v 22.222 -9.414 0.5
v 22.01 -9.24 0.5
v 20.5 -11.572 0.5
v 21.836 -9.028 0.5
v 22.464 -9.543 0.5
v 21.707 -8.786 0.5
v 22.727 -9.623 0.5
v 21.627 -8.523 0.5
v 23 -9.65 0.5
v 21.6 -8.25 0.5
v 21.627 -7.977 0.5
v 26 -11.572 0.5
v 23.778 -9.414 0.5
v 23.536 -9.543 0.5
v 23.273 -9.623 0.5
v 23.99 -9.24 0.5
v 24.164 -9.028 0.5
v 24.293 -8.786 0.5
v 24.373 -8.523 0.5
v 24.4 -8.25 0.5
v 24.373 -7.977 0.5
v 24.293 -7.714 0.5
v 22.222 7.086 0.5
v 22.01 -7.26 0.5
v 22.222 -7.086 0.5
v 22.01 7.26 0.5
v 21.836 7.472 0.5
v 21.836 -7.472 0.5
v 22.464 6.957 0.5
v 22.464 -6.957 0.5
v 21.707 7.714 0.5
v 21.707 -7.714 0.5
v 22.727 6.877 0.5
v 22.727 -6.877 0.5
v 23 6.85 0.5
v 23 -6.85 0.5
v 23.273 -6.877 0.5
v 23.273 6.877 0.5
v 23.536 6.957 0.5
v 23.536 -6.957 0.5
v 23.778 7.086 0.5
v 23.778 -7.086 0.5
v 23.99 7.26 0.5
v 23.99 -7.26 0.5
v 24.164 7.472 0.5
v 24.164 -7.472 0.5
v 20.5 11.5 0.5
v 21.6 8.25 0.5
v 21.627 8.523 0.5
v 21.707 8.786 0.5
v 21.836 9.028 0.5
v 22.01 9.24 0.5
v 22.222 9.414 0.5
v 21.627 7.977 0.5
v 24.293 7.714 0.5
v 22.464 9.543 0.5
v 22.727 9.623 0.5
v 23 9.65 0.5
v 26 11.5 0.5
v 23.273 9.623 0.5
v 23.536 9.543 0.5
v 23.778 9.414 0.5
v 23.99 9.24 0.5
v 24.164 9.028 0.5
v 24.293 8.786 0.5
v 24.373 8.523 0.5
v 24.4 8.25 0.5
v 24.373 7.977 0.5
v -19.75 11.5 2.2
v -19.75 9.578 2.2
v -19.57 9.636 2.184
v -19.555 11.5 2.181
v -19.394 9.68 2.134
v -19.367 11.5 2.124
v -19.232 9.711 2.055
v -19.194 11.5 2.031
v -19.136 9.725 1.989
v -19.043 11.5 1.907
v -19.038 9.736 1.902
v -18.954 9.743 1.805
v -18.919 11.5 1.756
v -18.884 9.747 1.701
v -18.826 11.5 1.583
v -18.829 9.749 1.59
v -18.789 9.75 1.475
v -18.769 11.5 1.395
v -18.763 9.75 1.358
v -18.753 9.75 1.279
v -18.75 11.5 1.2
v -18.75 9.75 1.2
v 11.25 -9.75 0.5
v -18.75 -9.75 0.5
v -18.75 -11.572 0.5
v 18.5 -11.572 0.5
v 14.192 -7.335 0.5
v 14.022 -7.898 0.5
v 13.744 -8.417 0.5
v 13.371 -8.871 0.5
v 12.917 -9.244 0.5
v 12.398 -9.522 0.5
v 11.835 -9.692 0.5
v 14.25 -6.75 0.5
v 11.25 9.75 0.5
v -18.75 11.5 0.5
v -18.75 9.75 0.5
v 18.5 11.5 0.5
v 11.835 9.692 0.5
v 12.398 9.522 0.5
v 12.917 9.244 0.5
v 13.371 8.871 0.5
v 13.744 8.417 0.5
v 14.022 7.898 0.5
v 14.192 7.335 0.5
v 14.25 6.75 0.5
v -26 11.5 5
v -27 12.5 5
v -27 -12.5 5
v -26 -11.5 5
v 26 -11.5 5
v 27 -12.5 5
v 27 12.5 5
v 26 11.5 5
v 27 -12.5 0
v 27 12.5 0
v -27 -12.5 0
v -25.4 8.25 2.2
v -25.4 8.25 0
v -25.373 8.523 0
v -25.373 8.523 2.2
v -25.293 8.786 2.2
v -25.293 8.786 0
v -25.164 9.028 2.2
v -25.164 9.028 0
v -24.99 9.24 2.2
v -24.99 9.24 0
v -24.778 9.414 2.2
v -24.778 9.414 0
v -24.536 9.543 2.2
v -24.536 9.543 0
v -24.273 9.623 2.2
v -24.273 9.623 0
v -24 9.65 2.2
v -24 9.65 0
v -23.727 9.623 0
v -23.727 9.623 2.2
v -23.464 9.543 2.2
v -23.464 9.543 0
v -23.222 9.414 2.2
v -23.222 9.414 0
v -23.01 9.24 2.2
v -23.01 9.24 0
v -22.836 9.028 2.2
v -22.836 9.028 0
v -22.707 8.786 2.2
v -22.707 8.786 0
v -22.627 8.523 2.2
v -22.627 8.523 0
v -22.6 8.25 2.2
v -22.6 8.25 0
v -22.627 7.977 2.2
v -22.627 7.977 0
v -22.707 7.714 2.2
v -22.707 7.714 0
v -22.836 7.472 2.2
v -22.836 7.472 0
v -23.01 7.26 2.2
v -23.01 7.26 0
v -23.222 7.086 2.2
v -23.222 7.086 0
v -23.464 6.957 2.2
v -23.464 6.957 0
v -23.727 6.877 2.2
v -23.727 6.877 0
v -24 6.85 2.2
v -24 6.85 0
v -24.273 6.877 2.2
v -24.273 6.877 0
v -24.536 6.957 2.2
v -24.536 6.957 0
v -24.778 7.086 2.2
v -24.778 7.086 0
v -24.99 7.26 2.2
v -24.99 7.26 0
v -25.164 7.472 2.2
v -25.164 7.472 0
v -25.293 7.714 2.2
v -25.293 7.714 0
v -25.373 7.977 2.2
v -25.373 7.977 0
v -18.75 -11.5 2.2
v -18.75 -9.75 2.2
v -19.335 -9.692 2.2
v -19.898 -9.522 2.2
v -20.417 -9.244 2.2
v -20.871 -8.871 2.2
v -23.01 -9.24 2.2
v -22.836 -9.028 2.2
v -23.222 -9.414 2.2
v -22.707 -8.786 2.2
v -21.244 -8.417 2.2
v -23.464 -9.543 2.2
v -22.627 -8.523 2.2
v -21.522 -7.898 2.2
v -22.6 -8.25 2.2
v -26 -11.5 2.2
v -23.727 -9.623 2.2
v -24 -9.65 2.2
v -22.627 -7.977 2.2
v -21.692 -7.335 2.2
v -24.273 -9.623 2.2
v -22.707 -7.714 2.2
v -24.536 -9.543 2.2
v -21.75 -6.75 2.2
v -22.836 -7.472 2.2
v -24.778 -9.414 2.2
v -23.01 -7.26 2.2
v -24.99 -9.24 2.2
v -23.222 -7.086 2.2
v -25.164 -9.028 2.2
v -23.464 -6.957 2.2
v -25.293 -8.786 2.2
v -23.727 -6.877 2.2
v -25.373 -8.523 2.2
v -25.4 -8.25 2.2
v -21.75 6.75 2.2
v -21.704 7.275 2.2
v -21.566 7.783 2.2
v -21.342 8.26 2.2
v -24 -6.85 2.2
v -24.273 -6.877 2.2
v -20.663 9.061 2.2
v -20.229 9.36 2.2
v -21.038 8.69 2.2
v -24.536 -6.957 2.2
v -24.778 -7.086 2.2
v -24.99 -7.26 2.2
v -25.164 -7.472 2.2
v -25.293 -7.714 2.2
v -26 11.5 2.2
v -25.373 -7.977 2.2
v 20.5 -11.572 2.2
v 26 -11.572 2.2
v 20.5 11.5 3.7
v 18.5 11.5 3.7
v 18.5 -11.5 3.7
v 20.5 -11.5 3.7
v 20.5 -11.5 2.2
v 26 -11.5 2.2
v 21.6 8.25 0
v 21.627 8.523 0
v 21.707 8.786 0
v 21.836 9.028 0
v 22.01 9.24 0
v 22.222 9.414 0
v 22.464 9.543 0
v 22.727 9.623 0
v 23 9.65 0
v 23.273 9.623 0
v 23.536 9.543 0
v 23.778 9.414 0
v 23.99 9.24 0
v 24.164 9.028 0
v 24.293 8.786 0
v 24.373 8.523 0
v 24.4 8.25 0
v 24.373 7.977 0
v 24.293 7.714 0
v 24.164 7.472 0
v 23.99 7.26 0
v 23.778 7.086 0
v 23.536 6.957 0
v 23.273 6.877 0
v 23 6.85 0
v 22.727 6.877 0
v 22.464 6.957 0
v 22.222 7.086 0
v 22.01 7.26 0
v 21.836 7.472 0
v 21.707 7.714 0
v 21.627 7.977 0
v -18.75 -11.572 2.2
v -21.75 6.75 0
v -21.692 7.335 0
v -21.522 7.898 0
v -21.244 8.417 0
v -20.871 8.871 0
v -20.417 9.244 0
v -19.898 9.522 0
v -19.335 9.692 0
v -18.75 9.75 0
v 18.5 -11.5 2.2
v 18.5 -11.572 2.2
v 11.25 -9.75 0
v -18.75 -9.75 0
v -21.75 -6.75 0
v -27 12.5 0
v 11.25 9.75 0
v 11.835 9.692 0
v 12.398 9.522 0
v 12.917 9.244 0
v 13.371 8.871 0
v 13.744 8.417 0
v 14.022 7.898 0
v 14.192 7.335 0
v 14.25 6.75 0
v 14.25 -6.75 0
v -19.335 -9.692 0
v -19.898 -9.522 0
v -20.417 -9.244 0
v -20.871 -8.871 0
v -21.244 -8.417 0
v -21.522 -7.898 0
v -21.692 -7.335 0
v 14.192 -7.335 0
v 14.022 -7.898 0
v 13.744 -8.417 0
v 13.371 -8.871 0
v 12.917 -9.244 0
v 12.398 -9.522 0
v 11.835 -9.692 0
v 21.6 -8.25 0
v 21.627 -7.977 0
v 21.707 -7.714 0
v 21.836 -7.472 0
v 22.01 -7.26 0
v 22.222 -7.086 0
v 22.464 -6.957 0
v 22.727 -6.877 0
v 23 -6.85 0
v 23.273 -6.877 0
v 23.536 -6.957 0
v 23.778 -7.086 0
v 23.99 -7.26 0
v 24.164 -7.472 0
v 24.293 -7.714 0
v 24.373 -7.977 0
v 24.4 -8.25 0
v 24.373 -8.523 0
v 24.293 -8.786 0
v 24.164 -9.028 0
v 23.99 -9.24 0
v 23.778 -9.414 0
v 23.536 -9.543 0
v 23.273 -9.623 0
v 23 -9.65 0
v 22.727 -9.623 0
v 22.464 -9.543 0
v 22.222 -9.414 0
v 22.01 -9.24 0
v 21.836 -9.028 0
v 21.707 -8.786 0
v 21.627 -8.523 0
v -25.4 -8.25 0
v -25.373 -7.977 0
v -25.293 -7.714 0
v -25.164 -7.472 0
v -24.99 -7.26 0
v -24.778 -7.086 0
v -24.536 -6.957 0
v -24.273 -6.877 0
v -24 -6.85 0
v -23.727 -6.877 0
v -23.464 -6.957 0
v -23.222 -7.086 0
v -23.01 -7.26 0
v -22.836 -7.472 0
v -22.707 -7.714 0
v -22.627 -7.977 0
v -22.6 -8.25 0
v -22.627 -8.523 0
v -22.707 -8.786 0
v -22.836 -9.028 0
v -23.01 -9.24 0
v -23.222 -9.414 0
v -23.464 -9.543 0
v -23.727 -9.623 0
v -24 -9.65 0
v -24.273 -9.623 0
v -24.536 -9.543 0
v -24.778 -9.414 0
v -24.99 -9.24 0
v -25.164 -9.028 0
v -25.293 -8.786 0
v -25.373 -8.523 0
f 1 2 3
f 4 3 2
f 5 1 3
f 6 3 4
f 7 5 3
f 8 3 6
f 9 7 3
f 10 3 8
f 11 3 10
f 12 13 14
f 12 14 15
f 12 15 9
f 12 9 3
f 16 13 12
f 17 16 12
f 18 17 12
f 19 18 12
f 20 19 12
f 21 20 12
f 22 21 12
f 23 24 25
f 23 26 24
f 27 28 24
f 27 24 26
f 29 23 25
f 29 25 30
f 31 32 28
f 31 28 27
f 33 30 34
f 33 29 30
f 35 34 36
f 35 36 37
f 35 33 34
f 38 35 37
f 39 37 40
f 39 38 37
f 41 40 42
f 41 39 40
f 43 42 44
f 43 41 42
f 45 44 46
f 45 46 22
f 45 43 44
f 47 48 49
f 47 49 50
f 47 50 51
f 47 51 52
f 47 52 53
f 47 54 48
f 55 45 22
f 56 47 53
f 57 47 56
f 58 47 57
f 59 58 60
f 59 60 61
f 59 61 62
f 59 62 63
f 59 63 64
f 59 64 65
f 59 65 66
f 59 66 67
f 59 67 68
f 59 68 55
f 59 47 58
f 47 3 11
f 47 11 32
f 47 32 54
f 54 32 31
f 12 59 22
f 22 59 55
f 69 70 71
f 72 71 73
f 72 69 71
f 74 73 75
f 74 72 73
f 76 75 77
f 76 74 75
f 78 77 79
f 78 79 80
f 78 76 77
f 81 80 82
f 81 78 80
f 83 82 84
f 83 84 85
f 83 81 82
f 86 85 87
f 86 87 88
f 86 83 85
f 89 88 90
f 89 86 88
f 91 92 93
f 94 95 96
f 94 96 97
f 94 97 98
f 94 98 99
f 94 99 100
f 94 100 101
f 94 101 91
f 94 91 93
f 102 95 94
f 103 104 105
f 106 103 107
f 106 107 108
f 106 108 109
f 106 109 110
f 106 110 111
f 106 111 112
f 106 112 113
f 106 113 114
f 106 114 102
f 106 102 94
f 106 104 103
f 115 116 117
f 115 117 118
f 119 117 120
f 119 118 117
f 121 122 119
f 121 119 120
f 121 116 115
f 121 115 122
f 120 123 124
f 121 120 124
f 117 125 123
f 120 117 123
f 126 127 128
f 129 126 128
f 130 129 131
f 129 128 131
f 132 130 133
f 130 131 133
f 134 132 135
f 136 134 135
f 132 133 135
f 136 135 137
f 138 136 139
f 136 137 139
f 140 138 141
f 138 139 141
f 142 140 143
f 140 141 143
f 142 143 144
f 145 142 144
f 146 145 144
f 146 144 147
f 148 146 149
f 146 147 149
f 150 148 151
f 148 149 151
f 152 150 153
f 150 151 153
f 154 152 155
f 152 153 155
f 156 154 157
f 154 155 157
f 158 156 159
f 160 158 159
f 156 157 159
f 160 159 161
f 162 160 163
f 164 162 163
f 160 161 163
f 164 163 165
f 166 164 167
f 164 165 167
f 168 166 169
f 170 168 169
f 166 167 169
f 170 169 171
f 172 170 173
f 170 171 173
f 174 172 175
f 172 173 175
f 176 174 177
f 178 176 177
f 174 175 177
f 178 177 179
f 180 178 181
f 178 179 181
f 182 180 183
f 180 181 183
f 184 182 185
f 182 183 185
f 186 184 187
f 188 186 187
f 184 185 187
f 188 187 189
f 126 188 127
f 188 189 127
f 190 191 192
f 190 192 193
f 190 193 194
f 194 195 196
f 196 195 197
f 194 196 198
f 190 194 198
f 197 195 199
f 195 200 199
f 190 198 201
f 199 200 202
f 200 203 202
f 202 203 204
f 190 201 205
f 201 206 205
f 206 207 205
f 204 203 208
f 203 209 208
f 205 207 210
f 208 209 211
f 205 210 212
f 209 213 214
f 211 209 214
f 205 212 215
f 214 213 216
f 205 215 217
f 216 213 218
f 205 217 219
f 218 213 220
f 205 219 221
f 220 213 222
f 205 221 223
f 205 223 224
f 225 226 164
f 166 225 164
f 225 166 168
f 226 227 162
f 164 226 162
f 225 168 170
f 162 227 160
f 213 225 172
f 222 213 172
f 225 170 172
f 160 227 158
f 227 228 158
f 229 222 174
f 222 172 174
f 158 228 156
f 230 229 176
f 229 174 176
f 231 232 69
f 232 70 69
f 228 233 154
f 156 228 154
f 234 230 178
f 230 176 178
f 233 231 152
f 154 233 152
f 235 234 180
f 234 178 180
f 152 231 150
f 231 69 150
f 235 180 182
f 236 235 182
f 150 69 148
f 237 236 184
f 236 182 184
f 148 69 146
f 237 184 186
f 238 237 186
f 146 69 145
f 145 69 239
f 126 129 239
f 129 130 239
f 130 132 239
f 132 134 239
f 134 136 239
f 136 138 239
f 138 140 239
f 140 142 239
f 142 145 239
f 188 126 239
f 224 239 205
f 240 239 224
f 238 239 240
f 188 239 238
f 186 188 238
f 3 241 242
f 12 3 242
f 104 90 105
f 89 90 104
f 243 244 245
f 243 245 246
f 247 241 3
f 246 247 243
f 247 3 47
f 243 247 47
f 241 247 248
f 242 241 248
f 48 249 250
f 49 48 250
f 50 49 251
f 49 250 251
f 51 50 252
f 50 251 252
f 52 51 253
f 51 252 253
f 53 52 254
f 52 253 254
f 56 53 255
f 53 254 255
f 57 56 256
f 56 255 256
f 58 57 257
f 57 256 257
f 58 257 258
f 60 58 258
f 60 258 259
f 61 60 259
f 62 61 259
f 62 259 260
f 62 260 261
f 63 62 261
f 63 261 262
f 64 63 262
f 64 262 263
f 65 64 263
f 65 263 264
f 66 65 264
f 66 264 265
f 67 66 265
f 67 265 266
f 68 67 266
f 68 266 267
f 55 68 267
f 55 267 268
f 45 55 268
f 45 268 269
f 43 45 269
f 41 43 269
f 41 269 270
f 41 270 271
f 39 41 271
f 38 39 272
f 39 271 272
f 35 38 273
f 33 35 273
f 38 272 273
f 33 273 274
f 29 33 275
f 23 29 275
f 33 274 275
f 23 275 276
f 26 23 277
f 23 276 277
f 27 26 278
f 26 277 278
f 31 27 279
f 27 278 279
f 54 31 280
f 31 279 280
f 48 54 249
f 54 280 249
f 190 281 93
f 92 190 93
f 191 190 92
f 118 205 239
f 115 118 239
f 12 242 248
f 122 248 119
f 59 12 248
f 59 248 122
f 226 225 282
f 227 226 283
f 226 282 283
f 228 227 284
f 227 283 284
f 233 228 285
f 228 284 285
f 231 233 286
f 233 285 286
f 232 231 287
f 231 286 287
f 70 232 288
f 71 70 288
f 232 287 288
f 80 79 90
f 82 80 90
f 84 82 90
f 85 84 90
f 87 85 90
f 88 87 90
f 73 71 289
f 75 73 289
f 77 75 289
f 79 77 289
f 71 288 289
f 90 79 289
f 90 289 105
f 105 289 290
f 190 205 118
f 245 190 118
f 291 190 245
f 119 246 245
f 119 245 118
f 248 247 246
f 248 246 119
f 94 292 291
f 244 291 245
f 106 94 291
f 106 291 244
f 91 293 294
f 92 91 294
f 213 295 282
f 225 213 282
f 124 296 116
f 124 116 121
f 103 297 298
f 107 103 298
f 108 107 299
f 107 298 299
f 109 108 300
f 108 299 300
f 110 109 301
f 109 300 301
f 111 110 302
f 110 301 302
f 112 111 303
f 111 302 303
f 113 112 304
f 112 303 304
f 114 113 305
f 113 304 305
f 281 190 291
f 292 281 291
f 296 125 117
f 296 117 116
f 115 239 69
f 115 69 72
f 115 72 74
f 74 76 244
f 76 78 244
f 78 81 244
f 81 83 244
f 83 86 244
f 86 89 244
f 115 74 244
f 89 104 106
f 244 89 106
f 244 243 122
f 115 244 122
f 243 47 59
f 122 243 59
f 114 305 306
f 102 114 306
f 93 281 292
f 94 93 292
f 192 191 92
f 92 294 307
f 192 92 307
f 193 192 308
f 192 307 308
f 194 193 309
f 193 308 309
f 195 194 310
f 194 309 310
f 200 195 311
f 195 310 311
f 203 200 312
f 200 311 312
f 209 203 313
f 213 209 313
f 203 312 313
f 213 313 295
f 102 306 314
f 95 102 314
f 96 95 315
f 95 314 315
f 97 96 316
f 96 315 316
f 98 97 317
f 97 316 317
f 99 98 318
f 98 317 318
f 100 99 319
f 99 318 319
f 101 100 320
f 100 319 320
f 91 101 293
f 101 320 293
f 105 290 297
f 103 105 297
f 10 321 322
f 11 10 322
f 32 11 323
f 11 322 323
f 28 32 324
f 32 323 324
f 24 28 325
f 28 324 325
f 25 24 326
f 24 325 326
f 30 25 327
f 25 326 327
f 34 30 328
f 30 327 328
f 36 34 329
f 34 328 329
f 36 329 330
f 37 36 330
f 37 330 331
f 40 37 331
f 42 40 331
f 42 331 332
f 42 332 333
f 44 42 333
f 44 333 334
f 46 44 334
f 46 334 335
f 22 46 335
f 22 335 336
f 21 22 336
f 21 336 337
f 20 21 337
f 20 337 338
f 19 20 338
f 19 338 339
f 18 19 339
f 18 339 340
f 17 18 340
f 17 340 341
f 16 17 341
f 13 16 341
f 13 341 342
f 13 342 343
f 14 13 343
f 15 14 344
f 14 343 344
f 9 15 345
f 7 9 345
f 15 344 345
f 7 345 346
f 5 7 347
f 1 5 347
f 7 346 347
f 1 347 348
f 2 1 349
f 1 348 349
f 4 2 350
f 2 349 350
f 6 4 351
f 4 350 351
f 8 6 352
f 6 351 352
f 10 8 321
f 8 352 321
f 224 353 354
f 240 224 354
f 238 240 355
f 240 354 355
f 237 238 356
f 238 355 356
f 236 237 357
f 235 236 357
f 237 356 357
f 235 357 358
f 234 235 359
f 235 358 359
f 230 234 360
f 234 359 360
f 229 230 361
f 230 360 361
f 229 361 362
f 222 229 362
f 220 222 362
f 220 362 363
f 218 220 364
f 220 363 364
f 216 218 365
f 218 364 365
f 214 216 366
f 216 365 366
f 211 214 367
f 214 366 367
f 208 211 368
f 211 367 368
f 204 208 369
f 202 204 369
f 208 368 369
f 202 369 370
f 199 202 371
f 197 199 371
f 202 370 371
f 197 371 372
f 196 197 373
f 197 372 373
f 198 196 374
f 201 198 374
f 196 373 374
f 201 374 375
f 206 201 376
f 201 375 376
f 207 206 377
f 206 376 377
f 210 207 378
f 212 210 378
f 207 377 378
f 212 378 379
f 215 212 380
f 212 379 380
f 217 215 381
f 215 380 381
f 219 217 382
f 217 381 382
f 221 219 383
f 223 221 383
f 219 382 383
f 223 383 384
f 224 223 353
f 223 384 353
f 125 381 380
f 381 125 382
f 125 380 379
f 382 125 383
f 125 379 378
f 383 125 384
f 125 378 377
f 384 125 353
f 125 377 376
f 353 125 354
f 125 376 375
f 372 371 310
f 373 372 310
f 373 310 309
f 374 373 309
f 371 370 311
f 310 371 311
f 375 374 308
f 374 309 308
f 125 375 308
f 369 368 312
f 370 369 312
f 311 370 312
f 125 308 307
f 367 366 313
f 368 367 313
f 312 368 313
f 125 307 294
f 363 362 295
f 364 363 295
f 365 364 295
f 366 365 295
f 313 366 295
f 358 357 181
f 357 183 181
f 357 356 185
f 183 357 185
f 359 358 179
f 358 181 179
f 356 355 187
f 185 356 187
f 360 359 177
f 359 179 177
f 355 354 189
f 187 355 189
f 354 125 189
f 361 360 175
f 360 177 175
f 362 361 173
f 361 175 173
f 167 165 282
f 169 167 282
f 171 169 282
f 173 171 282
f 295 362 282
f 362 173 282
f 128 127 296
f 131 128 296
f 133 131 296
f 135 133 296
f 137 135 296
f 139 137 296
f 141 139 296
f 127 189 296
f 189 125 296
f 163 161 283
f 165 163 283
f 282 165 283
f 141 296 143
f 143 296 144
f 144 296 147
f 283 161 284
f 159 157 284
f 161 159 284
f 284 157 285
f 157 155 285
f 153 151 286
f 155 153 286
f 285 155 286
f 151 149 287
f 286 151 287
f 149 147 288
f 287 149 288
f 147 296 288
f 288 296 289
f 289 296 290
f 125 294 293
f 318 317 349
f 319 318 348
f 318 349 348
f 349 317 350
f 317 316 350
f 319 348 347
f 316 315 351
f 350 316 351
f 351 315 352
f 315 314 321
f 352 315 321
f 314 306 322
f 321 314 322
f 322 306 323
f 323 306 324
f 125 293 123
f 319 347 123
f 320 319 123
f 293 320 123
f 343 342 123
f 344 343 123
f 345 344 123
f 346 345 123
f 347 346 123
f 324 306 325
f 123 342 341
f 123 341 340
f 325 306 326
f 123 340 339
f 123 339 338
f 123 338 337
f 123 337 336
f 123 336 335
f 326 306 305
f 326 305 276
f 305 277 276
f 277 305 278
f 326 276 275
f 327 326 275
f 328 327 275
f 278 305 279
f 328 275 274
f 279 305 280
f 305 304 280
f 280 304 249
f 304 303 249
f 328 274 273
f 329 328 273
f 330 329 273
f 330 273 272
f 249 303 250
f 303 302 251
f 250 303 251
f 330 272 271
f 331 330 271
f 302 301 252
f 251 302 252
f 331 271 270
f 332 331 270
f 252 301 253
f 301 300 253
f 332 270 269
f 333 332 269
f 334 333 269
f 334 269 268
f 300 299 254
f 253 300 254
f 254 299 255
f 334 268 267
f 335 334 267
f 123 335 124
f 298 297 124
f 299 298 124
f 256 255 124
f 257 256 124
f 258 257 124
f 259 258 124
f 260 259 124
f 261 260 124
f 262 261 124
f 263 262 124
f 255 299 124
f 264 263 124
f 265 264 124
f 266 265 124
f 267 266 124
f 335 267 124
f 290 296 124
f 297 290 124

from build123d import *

# Parameters (mm, degrees)
SKETCH1_W           = 54
SKETCH1_H           = 25
SKETCH1_W_2         = 52
SKETCH1_H_2         = 23
BOSS_EXTRUDE1_DEPTH = 5
SKETCH2_W           = 54
SKETCH2_H           = 25
SKETCH2_R           = 1.4
BOSS_EXTRUDE2_DEPTH = 2.2
SKETCH3_W           = 44.75
SKETCH3_H           = 23.07193706
CUT_EXTRUDE1_DEPTH  = 1.7
FILLET1_R           = 1
SKETCH5_W           = 2
SKETCH5_H           = 23.07193706
BOSS_EXTRUDE3_DEPTH = 3.2


with BuildPart() as part:
    # Sketch1 → Boss-Extrude1 (new body)
    with BuildSketch(Plane.XY):
        Rectangle(SKETCH1_W, SKETCH1_H)
        Rectangle(SKETCH1_W_2, SKETCH1_H_2, mode=Mode.SUBTRACT)
    extrude(amount=BOSS_EXTRUDE1_DEPTH)

    # Sketch2 → Boss-Extrude2 (add)
    with BuildSketch(Plane(origin=(0, 0, 0), x_dir=(-1, 0, 0), z_dir=(0, 0, -1))):
        Rectangle(SKETCH2_W, SKETCH2_H)
        with Locations((24, 8.25)):
            Circle(SKETCH2_R, mode=Mode.SUBTRACT)
        with Locations((24, -8.25)):
            Circle(SKETCH2_R, mode=Mode.SUBTRACT)
        with Locations((-23, 8.25)):
            Circle(SKETCH2_R, mode=Mode.SUBTRACT)
        with Locations((-23, -8.25)):
            Circle(SKETCH2_R, mode=Mode.SUBTRACT)
        with BuildLine():
            Line((-11.25, -9.75), (18.75, -9.75))
            ThreePointArc((18.75, -9.75), (20.871320344, -8.871320344), (21.75, -6.75))
            Line((21.75, -6.75), (21.75, 6.75))
            ThreePointArc((21.75, 6.75), (20.871320344, 8.871320344), (18.75, 9.75))
            Line((18.75, 9.75), (-11.25, 9.75))
            ThreePointArc((-11.25, 9.75), (-13.371320344, 8.871320344), (-14.25, 6.75))
            Line((-14.25, 6.75), (-14.25, -6.75))
            ThreePointArc((-14.25, -6.75), (-13.371320344, -8.871320344), (-11.25, -9.75))
        make_face(mode=Mode.SUBTRACT)
    extrude(amount=-BOSS_EXTRUDE2_DEPTH)

    # Sketch3 → Cut-Extrude1 (cut)
    with BuildSketch(Plane.XY.offset(2.2)):
        with Locations((3.625, -0.03596853)):
            Rectangle(SKETCH3_W, SKETCH3_H)
    extrude(amount=-CUT_EXTRUDE1_DEPTH, mode=Mode.SUBTRACT)

    # Fillet1
    fillet1_edges = [part.edges().sort_by_distance(p)[0] for p in [
        (-18.75, 10.625, 2.2),
    ]]
    fillet(fillet1_edges, radius=FILLET1_R)

    # Sketch5 → Boss-Extrude3 (add)
    with BuildSketch(Plane.XY.offset(0.5)):
        with Locations((19.5, -0.03596853)):
            Rectangle(SKETCH5_W, SKETCH5_H)
    extrude(amount=BOSS_EXTRUDE3_DEPTH)


solid = part.part
